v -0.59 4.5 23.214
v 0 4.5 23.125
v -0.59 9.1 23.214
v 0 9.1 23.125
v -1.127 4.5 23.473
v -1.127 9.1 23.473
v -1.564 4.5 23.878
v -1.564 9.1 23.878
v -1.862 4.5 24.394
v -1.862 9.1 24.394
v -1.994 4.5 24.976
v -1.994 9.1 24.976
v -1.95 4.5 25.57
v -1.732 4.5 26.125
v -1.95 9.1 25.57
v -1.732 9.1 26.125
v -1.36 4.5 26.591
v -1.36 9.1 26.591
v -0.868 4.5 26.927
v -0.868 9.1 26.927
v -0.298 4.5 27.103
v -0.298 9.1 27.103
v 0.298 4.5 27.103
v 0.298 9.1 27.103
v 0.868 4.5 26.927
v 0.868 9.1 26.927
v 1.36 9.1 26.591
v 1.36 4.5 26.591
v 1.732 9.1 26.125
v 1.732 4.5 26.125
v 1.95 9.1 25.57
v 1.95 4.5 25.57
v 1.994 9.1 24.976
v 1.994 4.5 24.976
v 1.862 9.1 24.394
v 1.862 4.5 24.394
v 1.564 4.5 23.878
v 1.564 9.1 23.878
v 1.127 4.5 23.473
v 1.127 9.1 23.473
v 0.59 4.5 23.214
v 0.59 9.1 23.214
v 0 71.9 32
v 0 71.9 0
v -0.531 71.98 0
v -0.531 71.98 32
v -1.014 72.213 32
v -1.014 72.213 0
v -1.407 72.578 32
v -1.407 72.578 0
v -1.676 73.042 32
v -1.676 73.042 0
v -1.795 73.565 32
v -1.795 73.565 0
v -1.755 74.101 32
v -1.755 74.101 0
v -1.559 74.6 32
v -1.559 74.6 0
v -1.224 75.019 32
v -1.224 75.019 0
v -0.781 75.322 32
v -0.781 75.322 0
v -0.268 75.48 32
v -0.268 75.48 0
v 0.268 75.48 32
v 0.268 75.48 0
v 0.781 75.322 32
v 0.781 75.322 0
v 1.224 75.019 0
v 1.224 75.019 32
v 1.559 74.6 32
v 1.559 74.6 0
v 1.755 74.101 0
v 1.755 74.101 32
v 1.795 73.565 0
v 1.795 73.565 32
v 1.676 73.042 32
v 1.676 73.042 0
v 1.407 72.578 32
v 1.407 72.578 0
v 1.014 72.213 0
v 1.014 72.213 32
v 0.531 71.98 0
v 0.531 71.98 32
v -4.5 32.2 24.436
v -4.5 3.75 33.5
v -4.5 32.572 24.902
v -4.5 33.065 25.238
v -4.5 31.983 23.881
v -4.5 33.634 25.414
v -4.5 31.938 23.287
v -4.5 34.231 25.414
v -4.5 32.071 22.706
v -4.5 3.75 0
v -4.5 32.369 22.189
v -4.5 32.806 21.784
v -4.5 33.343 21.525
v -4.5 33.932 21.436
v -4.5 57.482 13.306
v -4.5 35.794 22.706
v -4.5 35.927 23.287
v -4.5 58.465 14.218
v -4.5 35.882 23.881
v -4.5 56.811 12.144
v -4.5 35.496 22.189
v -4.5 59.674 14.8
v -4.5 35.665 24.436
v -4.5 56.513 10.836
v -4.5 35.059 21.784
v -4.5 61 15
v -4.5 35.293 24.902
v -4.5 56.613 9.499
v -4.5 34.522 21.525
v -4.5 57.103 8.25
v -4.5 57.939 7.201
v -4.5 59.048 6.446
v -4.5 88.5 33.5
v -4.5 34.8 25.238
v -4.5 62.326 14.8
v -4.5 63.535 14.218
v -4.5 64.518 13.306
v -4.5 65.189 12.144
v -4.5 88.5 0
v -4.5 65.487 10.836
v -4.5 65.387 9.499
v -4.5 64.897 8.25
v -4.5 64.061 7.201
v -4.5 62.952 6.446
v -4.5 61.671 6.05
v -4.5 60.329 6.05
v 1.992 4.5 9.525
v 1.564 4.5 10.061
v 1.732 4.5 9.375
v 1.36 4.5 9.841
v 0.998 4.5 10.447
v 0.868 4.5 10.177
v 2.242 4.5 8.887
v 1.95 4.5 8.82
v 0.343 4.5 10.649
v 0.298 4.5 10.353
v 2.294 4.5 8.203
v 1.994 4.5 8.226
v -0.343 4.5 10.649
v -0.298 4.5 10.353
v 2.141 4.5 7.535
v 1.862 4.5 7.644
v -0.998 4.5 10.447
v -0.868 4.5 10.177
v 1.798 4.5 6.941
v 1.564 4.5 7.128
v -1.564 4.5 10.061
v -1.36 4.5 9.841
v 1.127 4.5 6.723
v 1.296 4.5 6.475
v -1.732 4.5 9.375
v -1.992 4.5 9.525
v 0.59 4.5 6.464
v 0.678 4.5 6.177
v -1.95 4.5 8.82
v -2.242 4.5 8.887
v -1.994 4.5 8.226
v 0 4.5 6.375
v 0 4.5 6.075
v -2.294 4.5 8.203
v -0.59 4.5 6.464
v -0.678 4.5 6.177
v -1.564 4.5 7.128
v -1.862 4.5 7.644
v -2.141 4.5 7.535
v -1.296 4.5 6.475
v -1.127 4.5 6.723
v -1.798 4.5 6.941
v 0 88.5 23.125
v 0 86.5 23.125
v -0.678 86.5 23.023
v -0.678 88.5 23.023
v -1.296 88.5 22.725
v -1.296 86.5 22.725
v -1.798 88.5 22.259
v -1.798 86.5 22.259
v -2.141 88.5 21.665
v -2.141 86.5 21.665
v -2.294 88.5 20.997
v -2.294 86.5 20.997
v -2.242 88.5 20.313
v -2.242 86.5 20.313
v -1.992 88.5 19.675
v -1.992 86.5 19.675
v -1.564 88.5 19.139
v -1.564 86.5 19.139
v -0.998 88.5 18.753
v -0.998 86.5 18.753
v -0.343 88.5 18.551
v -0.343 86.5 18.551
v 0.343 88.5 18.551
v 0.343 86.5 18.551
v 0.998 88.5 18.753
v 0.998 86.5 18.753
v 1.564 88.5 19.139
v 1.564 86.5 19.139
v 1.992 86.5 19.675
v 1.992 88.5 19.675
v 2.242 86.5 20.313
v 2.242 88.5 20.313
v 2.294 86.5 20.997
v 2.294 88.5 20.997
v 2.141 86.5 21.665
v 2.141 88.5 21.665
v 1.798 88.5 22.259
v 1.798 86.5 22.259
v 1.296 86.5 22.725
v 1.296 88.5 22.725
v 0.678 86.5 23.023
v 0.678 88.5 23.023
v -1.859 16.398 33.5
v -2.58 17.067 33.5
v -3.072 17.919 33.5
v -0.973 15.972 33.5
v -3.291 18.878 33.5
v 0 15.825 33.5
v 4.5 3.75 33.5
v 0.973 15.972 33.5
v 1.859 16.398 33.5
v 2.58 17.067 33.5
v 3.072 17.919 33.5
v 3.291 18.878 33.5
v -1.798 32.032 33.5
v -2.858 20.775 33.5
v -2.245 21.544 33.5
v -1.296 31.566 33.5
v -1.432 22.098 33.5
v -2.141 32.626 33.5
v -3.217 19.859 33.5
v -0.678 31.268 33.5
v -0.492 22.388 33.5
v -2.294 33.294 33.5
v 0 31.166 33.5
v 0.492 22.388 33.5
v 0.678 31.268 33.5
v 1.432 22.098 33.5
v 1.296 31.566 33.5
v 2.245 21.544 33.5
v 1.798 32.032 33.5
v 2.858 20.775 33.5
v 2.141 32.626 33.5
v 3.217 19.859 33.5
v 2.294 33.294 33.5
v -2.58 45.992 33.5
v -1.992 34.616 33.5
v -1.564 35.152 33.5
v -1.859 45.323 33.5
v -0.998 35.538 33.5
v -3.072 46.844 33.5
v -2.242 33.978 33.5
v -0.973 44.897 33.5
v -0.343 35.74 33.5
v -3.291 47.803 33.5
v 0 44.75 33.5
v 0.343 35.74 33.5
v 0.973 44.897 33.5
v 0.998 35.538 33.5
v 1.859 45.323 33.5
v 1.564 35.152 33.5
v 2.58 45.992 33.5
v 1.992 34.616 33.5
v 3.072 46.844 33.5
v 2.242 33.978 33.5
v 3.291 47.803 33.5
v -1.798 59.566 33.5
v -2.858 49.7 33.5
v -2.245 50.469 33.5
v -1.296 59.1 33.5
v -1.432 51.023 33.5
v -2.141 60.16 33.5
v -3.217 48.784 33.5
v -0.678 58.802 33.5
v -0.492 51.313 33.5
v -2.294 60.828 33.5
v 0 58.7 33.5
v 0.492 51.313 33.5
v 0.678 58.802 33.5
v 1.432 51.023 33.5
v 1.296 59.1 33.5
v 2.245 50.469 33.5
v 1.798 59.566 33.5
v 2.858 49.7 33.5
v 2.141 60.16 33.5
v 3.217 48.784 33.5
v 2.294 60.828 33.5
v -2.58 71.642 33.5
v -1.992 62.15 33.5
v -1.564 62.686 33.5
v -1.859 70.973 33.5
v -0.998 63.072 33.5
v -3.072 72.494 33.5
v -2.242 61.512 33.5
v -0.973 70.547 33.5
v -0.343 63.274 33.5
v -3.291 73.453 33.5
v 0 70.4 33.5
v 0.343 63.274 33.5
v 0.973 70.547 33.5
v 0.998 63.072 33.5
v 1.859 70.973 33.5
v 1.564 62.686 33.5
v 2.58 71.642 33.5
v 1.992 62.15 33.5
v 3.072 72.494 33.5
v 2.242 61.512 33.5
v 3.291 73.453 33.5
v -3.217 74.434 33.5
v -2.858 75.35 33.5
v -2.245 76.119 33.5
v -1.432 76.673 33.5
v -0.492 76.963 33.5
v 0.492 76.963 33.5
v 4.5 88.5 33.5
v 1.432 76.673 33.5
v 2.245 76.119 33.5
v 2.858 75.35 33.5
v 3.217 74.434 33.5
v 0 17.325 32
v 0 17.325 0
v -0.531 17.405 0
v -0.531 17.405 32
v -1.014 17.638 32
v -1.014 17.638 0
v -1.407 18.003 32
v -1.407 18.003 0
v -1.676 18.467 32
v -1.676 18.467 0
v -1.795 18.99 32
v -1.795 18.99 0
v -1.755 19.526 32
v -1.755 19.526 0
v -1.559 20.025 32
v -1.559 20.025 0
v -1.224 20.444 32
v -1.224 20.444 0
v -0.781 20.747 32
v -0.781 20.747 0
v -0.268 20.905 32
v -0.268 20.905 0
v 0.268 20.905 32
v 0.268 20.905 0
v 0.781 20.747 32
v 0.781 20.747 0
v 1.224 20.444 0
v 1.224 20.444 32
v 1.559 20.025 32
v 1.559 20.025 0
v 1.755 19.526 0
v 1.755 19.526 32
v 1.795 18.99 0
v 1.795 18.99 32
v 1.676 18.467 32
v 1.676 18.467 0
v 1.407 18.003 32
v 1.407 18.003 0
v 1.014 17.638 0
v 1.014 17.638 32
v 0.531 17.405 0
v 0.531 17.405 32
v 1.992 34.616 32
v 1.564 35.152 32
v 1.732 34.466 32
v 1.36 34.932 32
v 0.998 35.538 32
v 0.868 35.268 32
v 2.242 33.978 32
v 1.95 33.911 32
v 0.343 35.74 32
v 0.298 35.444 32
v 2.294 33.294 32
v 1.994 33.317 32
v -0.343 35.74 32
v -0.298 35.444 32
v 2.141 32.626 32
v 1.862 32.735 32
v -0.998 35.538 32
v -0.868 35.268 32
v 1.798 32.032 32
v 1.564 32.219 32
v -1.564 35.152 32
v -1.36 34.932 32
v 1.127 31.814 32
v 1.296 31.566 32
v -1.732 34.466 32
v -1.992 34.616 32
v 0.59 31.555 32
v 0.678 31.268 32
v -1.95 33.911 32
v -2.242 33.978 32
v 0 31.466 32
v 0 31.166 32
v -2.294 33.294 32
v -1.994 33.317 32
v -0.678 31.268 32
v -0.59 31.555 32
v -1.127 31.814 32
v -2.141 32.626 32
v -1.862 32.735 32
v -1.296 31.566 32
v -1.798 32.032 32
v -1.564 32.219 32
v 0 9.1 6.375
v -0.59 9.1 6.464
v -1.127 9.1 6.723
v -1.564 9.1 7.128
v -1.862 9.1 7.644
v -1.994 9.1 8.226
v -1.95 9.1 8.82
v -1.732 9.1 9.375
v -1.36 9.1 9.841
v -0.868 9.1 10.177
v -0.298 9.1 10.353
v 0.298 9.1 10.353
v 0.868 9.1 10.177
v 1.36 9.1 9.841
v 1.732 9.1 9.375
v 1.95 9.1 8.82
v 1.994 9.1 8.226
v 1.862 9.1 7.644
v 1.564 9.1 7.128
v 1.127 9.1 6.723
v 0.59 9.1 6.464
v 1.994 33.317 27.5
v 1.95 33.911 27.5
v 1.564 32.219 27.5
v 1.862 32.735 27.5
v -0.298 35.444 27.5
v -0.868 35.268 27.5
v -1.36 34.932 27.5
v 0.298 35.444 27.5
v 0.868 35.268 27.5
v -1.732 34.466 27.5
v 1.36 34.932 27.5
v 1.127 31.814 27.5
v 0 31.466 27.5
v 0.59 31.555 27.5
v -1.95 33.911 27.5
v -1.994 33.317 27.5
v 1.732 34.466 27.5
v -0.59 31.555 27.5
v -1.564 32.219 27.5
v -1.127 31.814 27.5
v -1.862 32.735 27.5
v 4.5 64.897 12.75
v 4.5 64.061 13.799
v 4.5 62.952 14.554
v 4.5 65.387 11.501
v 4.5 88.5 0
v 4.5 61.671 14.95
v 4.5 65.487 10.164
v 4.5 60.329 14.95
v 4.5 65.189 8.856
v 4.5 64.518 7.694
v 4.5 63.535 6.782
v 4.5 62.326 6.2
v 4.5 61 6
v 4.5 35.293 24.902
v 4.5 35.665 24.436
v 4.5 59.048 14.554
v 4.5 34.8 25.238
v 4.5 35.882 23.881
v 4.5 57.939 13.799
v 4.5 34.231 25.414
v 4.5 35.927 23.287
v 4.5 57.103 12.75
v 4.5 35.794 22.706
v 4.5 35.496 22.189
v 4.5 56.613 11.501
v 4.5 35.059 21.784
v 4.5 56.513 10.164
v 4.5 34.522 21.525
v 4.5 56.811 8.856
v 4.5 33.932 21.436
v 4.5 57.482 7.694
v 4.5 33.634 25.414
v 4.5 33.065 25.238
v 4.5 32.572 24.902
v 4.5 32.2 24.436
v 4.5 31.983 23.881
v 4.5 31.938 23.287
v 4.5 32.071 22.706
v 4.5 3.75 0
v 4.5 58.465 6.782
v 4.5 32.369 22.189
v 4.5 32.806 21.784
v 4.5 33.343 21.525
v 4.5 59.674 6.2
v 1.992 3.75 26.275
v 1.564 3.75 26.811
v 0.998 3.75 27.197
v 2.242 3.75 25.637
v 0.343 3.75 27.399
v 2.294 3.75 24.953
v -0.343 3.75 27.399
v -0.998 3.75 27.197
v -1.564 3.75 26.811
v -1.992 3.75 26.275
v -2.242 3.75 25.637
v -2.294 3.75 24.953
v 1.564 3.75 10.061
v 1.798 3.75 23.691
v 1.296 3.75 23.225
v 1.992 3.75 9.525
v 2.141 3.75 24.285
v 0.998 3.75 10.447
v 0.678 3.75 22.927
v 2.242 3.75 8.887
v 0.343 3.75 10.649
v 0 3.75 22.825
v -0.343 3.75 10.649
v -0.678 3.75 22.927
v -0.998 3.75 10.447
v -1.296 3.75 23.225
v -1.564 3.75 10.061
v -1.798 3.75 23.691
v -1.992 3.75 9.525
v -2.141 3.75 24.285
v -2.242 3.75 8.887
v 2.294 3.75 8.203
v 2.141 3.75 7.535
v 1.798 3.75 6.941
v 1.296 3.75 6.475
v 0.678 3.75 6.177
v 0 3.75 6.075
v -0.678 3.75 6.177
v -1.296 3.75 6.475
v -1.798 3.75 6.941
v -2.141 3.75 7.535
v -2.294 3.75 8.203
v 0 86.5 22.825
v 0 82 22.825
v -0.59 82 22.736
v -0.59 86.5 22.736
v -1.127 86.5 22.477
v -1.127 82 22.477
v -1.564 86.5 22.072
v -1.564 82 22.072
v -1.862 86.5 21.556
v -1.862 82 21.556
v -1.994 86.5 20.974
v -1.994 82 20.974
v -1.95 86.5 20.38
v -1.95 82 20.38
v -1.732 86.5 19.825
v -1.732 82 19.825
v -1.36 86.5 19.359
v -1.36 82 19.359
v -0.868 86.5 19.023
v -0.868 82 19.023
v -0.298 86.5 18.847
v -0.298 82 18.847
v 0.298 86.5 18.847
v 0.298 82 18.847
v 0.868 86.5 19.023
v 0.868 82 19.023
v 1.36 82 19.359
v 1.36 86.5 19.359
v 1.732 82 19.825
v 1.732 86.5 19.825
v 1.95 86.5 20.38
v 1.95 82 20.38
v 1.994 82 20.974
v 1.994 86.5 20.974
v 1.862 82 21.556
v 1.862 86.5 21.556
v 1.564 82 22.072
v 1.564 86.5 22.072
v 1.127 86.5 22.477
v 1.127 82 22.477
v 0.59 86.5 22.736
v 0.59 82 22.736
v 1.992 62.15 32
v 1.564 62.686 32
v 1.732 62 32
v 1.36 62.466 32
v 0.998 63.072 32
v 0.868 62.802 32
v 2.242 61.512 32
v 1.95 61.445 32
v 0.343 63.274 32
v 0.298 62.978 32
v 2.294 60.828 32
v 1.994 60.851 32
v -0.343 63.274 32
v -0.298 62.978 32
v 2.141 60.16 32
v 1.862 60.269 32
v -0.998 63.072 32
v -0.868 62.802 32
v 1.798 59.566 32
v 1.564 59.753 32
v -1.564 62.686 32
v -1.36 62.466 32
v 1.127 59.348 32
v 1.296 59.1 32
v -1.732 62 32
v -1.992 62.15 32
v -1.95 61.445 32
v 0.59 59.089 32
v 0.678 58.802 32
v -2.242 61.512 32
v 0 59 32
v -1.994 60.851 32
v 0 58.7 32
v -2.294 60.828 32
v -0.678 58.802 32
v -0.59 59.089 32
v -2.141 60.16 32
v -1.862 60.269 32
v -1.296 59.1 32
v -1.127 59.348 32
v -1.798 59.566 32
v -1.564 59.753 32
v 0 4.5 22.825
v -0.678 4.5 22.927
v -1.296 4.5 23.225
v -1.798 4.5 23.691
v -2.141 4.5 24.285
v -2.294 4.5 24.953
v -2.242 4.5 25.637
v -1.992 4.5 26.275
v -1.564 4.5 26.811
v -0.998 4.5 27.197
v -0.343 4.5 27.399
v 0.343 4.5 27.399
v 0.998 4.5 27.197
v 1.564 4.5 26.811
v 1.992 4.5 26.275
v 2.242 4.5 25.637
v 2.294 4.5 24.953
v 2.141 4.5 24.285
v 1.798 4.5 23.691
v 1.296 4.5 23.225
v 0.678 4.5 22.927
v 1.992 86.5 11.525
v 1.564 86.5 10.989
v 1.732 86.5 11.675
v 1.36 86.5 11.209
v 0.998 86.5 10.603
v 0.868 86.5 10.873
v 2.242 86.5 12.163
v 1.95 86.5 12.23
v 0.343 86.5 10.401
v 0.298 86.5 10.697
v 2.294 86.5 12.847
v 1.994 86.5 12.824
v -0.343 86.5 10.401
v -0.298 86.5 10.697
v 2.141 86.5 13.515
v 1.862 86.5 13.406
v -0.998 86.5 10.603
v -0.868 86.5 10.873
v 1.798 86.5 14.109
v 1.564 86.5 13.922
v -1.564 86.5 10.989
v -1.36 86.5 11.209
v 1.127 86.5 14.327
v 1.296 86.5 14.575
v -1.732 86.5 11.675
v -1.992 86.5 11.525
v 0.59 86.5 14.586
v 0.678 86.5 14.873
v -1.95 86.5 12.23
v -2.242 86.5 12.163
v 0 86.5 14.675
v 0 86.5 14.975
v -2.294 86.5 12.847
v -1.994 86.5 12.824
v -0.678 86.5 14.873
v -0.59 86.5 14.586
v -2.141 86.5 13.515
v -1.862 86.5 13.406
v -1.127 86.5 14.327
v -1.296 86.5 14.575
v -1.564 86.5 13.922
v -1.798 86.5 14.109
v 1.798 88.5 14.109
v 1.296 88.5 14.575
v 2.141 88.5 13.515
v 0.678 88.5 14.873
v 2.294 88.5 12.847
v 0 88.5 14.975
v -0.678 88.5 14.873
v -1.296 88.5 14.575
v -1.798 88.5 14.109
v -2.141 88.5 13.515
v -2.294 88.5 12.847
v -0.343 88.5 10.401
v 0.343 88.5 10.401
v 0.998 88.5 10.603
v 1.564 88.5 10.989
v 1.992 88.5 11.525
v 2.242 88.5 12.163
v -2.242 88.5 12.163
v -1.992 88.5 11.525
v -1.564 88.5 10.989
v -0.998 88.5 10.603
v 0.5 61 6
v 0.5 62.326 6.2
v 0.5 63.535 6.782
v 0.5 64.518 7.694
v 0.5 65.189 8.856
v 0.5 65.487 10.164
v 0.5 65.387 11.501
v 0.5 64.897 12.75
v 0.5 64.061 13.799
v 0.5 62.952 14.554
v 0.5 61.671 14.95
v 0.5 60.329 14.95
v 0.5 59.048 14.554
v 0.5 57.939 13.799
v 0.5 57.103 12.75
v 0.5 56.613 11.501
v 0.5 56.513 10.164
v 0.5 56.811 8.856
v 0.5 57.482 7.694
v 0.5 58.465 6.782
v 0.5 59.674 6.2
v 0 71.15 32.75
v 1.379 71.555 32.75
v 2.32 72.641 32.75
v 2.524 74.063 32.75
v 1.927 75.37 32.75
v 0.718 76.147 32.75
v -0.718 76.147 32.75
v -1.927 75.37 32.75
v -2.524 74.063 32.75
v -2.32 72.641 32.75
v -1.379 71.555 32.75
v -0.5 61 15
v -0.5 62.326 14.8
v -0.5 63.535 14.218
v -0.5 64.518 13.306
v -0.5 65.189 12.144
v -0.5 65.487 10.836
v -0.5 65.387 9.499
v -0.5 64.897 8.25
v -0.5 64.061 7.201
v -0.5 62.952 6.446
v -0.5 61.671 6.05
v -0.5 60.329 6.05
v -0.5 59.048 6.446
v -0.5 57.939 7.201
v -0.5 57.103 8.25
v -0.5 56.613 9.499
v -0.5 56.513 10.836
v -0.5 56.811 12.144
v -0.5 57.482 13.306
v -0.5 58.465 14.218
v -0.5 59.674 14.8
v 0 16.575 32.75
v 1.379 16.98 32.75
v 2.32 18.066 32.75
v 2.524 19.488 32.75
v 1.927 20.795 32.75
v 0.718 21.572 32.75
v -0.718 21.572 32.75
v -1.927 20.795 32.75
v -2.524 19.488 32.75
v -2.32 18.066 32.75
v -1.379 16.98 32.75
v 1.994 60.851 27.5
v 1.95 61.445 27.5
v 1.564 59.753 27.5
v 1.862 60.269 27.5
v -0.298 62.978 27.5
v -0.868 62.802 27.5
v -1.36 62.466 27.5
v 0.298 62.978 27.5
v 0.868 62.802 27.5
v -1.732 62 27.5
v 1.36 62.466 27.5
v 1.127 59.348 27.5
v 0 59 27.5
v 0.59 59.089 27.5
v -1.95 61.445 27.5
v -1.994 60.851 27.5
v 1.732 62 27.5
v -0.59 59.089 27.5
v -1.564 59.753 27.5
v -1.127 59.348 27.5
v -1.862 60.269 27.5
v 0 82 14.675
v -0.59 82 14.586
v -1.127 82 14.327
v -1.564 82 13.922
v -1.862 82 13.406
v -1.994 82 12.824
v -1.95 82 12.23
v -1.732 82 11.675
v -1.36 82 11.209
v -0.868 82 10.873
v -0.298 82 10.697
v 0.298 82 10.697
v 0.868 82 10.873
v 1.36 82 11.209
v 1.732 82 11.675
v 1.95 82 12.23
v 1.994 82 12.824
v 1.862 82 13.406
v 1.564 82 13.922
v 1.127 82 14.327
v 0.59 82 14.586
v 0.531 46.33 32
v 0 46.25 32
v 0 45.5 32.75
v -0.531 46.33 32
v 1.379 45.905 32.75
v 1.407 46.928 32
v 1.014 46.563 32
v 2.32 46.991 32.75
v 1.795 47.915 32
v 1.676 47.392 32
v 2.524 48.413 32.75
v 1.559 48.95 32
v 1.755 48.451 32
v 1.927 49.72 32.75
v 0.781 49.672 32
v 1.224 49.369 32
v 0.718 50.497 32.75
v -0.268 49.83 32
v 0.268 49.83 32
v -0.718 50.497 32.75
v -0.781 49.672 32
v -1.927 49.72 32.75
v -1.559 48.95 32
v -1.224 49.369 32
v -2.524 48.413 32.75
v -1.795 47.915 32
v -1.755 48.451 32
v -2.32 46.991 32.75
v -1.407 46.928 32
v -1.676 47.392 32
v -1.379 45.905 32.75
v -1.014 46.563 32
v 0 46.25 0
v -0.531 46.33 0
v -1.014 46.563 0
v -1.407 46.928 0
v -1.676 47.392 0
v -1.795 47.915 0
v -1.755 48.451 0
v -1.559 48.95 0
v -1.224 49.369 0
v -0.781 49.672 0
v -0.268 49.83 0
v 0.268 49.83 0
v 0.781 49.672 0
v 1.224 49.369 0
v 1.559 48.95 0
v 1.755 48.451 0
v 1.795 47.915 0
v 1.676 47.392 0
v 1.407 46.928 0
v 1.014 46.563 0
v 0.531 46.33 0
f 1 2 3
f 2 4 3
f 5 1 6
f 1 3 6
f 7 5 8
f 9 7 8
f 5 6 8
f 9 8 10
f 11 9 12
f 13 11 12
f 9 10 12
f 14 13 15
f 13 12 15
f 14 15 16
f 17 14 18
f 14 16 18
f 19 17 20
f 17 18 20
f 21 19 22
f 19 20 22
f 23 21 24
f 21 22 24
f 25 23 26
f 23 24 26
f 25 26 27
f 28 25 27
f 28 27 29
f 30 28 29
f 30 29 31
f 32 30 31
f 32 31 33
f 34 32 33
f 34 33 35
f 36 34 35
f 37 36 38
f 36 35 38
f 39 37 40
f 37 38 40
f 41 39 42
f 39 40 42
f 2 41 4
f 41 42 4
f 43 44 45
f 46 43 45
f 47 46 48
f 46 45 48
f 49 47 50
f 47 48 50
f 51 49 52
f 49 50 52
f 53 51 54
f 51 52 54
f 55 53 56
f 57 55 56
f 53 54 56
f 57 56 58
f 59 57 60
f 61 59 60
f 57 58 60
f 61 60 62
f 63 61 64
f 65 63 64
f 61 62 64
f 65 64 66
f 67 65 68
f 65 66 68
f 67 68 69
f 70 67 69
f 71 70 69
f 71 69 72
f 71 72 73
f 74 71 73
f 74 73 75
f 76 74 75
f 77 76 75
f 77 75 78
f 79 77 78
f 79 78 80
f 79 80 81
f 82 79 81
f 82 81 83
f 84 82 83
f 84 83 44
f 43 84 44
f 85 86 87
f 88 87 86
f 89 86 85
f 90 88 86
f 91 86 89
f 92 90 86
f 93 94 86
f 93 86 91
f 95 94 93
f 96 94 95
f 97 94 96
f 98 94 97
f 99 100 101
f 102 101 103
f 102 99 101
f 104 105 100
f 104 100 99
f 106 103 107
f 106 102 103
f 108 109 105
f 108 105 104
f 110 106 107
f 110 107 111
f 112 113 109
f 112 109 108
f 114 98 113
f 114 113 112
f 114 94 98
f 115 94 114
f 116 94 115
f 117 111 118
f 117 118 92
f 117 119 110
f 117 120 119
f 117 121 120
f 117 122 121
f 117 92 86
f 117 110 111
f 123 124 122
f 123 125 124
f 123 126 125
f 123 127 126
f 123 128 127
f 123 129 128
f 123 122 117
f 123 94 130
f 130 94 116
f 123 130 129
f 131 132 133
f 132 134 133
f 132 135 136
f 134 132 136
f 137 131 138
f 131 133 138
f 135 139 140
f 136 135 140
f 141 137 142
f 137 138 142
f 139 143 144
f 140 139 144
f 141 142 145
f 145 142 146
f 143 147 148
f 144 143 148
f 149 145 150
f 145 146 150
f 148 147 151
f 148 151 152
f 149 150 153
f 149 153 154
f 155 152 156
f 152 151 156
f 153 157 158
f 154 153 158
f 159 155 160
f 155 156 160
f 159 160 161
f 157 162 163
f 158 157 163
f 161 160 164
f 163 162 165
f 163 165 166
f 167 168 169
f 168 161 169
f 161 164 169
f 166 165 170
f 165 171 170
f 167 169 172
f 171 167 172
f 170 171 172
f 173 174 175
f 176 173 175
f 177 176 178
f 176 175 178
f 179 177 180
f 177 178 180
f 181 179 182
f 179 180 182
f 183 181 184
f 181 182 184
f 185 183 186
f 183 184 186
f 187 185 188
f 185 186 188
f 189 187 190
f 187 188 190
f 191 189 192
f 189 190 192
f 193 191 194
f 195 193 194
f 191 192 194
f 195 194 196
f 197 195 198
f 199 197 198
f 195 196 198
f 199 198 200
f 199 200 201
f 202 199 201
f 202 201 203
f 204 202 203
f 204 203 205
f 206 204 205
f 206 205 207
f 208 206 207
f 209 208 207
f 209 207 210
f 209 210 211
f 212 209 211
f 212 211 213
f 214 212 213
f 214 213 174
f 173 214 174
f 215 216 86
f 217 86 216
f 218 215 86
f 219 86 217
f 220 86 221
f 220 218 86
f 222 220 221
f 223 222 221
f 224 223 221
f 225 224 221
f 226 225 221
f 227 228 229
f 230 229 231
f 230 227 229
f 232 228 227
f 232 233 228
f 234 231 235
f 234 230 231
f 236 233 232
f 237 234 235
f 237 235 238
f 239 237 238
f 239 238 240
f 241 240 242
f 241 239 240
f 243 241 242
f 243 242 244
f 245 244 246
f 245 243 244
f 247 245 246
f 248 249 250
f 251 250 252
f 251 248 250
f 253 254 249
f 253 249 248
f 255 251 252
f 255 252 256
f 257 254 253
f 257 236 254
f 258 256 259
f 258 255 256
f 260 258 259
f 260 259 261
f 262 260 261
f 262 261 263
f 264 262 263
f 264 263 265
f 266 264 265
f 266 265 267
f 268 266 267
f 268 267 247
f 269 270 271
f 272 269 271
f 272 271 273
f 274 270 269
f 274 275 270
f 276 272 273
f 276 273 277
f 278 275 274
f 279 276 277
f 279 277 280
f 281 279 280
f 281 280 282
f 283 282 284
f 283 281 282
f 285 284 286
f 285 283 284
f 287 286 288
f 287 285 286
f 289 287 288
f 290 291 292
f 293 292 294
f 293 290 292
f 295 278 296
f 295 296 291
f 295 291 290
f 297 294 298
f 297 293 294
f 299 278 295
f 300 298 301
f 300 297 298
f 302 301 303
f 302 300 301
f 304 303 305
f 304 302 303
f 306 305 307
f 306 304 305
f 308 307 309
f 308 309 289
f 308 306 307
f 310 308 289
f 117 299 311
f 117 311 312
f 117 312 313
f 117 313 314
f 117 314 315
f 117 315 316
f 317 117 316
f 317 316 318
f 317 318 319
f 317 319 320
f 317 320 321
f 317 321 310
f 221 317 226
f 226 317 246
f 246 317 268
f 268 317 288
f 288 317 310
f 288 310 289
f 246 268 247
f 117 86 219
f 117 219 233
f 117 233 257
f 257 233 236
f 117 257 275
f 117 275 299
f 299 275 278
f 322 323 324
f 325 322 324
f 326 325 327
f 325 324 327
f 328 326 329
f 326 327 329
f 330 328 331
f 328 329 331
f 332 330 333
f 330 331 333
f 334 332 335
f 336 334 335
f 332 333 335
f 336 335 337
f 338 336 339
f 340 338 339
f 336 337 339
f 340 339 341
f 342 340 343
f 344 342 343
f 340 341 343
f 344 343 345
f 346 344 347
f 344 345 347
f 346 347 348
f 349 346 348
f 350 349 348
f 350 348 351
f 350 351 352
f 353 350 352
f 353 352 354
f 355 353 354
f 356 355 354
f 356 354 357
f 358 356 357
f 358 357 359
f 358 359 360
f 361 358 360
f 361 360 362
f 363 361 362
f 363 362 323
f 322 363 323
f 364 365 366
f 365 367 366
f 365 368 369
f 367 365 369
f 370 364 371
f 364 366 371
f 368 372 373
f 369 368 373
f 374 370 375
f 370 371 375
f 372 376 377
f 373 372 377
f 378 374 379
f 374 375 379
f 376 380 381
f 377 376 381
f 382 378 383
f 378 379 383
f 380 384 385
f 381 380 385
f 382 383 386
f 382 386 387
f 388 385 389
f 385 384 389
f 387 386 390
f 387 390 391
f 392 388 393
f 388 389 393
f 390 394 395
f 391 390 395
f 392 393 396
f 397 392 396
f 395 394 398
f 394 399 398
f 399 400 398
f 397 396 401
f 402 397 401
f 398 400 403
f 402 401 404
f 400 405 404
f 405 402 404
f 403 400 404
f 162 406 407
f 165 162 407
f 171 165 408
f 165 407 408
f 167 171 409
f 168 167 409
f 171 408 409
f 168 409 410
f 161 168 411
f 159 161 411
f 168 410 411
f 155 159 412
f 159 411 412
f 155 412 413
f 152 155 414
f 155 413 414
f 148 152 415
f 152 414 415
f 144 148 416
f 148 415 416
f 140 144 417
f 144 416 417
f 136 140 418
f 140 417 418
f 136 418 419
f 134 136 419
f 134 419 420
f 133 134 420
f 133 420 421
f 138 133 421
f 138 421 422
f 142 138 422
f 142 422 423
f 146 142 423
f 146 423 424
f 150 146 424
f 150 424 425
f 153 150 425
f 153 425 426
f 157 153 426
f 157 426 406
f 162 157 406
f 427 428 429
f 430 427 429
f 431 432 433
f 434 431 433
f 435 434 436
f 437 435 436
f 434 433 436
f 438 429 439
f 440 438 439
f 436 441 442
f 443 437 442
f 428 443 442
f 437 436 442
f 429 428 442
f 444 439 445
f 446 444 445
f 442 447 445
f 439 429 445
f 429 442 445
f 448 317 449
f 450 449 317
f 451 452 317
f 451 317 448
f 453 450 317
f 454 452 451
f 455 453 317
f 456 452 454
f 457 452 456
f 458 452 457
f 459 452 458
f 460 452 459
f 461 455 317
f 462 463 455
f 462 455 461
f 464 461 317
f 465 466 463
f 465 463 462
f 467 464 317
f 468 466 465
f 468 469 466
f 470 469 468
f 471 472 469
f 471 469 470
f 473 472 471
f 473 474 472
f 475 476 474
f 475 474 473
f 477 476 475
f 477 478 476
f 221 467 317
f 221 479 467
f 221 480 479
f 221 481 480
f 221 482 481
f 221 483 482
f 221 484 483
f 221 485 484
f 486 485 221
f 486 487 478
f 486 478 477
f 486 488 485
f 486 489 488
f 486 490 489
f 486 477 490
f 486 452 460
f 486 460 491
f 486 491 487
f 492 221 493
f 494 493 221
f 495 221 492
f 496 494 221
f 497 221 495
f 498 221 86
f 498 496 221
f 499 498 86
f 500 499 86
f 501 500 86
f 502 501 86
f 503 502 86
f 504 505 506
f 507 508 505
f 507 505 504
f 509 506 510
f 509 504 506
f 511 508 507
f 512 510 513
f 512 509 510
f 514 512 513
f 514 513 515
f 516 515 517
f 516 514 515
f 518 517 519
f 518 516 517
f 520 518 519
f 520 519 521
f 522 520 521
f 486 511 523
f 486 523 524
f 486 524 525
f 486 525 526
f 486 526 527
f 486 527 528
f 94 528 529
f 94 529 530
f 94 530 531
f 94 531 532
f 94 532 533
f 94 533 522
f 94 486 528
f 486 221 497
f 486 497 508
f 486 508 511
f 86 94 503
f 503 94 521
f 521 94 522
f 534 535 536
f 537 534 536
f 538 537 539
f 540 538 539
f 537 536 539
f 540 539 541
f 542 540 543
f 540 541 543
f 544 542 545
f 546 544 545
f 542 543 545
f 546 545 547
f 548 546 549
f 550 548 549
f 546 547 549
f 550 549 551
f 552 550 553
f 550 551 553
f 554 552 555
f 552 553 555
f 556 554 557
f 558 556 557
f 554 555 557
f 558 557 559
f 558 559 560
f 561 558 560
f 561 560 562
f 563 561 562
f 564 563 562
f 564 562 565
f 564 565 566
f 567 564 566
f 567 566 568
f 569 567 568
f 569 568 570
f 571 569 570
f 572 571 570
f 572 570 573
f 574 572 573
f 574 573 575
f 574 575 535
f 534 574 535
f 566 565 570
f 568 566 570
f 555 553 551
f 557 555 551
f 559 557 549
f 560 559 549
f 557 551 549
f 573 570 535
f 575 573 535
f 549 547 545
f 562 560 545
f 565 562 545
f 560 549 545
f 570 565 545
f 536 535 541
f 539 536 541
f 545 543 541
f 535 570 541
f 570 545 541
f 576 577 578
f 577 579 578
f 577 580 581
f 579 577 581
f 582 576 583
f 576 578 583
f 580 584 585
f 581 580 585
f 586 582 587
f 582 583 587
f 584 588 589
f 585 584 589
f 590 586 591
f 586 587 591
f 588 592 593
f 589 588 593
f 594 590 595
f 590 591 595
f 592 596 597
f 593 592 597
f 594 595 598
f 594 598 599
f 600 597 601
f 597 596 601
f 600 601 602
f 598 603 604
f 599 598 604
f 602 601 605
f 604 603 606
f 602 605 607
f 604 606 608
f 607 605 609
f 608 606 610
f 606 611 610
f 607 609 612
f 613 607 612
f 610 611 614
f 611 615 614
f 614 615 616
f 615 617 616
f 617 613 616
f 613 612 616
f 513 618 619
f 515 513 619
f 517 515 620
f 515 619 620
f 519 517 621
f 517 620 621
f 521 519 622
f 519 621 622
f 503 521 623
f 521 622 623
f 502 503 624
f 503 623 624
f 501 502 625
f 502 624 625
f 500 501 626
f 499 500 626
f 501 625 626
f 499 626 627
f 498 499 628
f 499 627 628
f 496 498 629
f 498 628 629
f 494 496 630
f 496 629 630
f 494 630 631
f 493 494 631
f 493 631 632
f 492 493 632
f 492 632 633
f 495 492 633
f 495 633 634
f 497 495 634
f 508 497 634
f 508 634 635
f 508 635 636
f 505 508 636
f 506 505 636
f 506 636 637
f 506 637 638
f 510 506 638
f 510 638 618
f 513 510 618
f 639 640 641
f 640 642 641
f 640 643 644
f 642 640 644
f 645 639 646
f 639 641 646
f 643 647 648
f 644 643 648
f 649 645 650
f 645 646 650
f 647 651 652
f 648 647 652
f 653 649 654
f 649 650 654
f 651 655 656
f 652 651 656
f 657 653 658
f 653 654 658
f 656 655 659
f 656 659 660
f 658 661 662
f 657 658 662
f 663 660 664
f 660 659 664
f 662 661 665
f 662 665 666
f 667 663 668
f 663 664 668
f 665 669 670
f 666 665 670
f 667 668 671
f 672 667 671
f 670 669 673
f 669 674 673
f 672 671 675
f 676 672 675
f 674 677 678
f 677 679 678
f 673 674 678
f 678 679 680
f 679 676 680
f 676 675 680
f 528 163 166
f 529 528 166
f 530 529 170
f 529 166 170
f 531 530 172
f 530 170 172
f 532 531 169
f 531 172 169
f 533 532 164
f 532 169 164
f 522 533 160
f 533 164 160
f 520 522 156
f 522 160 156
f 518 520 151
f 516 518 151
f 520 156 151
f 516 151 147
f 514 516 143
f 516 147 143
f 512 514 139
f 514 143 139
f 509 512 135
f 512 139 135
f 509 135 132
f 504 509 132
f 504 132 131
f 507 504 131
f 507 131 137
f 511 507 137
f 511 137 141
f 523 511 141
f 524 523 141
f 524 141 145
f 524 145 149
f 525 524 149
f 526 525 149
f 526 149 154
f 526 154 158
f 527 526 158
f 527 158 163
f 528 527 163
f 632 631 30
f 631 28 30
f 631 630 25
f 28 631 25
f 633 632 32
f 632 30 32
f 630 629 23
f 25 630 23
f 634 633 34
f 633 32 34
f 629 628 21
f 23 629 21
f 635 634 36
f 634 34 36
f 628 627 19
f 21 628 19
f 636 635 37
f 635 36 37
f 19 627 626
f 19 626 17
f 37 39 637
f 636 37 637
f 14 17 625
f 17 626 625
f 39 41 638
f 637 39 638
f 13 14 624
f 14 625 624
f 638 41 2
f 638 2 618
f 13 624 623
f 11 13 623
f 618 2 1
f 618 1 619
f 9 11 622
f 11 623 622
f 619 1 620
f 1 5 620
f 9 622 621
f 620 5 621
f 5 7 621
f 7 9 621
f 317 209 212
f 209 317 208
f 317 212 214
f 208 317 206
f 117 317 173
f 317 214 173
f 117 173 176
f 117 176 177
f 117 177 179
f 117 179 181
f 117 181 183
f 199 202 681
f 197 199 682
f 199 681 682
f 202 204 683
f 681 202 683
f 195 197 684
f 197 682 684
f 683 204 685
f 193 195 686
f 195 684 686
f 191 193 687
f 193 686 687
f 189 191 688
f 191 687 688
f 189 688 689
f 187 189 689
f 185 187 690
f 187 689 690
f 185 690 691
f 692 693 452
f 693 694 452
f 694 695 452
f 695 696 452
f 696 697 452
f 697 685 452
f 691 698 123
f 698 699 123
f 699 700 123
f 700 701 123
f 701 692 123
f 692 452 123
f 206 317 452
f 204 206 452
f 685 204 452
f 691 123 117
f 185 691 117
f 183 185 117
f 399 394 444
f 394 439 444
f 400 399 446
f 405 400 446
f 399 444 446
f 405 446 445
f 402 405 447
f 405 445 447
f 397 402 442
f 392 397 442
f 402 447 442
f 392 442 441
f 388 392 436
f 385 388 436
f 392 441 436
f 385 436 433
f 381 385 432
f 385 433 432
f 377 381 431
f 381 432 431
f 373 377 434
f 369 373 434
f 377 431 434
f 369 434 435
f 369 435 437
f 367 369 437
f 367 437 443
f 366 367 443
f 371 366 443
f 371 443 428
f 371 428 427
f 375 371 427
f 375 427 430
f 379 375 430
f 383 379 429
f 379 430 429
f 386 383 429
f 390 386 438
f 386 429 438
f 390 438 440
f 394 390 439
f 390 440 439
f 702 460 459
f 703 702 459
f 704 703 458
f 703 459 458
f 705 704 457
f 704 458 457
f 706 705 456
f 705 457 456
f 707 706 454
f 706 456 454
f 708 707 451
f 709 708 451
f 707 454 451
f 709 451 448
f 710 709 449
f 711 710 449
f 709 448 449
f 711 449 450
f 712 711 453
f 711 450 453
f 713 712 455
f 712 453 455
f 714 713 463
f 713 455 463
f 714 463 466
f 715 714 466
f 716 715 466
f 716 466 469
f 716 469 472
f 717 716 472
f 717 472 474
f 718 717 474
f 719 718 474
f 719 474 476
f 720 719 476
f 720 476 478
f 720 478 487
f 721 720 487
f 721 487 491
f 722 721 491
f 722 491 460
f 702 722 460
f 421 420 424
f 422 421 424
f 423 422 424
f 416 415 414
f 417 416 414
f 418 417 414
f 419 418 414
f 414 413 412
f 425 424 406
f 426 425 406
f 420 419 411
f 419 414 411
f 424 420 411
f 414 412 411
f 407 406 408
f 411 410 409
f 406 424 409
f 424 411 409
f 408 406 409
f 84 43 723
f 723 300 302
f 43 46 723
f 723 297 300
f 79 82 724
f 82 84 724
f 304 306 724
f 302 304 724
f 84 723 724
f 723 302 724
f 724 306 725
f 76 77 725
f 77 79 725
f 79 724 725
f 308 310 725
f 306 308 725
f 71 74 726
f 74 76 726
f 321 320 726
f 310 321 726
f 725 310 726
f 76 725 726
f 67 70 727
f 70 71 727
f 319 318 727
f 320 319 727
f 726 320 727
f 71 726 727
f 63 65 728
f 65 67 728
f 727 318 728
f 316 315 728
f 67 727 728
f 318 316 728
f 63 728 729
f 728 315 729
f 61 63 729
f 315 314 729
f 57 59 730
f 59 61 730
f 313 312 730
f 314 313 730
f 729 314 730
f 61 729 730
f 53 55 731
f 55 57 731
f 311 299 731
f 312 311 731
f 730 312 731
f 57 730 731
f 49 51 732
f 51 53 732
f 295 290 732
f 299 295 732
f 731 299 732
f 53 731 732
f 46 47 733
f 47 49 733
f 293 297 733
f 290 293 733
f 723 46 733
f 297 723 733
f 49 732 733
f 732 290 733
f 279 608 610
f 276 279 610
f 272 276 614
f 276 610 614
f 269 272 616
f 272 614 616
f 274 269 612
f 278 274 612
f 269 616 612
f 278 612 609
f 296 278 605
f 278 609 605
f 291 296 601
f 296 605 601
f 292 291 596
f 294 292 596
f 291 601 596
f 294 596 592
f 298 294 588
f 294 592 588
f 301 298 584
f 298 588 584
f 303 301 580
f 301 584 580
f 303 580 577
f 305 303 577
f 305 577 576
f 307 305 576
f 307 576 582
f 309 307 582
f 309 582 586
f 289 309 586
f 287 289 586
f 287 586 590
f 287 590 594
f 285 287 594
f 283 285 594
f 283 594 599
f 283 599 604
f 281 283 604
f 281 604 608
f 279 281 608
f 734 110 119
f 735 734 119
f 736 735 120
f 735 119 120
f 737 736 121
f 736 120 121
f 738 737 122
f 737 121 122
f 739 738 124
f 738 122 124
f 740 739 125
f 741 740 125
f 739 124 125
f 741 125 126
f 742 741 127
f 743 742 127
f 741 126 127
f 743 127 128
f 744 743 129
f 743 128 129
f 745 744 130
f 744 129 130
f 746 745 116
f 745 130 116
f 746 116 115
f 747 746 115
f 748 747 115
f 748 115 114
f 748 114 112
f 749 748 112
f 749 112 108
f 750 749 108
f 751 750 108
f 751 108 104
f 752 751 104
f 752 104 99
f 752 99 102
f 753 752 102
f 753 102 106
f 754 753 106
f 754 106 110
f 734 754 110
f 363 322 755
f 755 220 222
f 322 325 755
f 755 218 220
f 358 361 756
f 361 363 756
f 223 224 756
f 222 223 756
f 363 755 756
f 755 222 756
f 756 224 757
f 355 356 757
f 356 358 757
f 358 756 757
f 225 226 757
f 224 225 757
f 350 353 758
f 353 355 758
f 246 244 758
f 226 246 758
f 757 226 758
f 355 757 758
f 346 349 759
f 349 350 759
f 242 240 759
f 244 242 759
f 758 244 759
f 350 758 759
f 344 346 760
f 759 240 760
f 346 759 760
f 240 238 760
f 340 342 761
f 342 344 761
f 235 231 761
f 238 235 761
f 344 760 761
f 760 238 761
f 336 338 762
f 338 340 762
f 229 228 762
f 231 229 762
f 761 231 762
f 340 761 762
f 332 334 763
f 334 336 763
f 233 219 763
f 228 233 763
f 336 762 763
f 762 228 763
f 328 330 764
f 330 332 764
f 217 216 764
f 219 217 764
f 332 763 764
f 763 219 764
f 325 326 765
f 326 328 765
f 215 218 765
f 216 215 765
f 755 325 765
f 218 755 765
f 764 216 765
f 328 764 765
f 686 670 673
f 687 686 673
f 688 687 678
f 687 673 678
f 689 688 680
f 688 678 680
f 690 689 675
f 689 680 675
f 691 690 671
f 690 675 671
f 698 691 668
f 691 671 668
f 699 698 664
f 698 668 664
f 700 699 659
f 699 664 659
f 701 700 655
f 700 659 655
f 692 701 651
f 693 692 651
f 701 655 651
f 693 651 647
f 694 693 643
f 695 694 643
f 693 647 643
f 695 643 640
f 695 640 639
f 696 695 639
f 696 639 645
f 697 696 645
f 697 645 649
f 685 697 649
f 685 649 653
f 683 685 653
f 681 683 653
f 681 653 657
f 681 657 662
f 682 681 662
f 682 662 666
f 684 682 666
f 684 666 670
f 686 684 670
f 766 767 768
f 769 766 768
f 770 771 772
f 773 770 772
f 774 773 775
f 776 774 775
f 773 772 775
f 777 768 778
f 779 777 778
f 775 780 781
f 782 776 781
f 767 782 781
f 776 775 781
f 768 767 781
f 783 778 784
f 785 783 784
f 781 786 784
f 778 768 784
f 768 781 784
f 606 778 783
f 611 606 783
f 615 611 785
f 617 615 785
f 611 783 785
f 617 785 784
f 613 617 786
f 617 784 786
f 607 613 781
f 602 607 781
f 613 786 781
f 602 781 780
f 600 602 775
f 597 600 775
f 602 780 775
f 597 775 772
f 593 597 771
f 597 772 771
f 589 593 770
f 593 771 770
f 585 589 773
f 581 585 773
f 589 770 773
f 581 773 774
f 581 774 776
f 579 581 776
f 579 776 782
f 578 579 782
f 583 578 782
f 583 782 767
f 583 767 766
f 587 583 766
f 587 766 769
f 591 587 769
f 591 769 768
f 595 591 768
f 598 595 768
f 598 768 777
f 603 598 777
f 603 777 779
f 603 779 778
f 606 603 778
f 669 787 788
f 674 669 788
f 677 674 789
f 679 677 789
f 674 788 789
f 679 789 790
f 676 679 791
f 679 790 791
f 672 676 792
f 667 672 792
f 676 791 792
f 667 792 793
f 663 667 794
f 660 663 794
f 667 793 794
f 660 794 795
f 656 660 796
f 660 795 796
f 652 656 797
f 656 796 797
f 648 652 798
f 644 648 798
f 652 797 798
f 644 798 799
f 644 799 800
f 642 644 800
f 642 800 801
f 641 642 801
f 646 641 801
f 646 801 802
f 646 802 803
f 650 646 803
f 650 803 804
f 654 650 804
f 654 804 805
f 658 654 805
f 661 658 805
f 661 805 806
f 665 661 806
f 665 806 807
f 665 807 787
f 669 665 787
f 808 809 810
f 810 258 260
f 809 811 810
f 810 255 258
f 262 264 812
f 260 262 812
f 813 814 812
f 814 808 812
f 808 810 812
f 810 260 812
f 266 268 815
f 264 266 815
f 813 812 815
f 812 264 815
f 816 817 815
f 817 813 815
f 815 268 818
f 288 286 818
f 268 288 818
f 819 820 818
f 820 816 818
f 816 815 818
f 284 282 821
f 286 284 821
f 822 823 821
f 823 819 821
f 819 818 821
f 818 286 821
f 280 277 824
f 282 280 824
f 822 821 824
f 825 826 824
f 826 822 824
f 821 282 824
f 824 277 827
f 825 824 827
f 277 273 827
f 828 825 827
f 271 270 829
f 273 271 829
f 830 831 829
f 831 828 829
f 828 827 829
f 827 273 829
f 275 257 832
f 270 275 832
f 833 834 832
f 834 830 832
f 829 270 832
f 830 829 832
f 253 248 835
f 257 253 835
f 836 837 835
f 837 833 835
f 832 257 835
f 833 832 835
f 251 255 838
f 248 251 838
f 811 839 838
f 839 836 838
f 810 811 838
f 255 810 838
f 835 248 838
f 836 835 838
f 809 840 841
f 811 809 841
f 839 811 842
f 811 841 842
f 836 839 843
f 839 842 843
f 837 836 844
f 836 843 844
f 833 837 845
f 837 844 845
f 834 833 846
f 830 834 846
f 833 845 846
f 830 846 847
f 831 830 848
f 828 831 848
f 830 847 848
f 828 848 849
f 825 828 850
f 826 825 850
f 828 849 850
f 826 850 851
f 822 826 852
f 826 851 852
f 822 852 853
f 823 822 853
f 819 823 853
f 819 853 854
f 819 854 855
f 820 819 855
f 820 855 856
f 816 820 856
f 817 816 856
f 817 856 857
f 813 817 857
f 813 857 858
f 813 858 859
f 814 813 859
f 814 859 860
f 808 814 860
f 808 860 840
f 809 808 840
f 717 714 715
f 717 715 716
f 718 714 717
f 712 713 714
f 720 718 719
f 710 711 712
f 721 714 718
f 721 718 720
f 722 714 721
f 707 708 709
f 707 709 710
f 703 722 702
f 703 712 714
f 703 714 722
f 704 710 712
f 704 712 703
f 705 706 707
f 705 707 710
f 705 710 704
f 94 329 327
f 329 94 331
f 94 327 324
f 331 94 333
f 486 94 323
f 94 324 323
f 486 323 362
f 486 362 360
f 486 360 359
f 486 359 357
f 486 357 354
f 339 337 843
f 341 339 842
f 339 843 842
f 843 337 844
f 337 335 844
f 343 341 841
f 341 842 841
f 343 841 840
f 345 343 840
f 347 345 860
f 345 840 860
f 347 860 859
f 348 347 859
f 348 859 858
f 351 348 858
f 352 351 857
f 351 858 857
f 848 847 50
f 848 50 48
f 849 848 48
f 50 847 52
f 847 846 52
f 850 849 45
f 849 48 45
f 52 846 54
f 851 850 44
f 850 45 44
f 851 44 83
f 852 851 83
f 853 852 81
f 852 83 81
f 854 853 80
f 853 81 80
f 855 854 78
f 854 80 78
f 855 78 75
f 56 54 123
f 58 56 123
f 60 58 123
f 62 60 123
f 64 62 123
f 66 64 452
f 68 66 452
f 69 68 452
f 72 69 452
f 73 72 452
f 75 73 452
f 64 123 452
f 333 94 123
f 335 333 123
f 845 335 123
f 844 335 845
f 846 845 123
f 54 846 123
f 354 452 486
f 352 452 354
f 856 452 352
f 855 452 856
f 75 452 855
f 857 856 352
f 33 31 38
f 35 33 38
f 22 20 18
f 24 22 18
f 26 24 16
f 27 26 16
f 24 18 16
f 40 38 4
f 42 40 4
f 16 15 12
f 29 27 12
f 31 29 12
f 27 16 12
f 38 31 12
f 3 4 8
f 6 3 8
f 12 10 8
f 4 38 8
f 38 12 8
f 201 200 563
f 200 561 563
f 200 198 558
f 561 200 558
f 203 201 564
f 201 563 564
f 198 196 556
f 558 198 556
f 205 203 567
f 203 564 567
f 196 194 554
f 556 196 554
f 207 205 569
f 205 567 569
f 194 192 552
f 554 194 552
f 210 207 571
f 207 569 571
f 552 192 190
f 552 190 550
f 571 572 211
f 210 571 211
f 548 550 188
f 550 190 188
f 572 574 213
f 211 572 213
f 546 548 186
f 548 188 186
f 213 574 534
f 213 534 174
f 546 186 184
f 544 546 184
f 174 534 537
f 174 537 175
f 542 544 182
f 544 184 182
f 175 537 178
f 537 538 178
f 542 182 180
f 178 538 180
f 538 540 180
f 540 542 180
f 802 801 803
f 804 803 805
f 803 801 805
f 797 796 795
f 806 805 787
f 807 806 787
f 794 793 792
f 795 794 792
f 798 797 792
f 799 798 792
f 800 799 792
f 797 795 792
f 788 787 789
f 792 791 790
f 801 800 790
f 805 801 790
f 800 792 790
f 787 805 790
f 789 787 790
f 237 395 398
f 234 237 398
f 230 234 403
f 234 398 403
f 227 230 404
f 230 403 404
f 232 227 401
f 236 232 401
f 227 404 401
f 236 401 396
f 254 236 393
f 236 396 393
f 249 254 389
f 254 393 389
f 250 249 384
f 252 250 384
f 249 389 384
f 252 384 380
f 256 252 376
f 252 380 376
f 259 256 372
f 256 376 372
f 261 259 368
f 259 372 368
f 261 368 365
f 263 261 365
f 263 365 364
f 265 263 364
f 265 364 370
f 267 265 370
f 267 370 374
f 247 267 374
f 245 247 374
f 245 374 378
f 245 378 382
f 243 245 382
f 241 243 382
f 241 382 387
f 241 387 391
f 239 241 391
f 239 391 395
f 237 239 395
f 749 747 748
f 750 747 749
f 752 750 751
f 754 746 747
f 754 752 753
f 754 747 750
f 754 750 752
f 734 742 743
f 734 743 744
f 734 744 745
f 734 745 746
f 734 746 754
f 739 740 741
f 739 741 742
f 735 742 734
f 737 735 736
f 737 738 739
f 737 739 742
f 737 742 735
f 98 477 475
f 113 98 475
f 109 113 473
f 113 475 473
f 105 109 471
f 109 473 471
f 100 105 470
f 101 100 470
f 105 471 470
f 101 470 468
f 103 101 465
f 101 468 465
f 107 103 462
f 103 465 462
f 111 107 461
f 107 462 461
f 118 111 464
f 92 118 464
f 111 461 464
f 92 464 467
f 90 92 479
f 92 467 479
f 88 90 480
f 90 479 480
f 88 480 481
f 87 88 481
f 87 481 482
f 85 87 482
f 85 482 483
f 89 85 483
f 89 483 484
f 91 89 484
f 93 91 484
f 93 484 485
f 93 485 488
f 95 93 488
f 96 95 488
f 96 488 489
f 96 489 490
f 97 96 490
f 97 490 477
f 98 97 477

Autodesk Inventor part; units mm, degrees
ref_plane "YZ Plane" through (0, 0, 0) normal (1, 0, 0) x (0, 1, 0)
ref_plane "XZ Plane" through (0, 0, 0) normal (0, 1, 0) x (-1, 0, 0)
ref_plane "Work Plane1" through (0, 0, 0) normal (0, 0, 1) x (1, 0, 0)
ref_plane "Work Plane2" through (-89, -40.3889, 33.5) normal (0, 0, 1) x (1, 0, 0)
sketch "Sketch1" plane through (0, 0, 0) normal (0, 0, 1) x (1, 0, 0)
  line L0 (23.5, 88.5) -> (-23.5, 88.5) projected
  line L1 (-23.5, 88.5) -> (-23.5, 36.5) projected
  line L2 (-26.5, 33.5) -> (-89, 33.5) projected
  line L3 (-89, 33.5) -> (-89, -72.5) projected
  line L4 (-89, -72.5) -> (-77, -72.5) projected
  line L5 (-74, -75.5) -> (-74, -93.5) projected
  line L6 (-74, -93.5) -> (74, -93.5) projected
  line L7 (74, -93.5) -> (74, -75.5) projected
  line L8 (77, -72.5) -> (89, -72.5) projected
  line L9 (89, -72.5) -> (89, 33.5) projected
  line L10 (89, 33.5) -> (26.5, 33.5) projected
  line L11 (23.5, 36.5) -> (23.5, 88.5) projected
  line L12 (-4.5, 81.5) -> (-4.5, 36.5) projected
  line L13 (-7.5, 33.5) -> (-13.5, 33.5) projected
  line L14 (-16.5, 36.5) -> (-16.5, 81.5) projected
  line L15 (-13.5, 84.5) -> (-7.5, 84.5) projected
  line L16 (16.5, 81.5) -> (16.5, 36.5) projected
  line L17 (13.5, 33.5) -> (7.5, 33.5) projected
  line L18 (4.5, 36.5) -> (4.5, 81.5) projected
  line L19 (7.5, 84.5) -> (13.5, 84.5) projected
  line L20 (-4.5, 88.5) -> (4.5, 88.5)
  line L21 (4.5, 88.5) -> (4.5, 3.75)
  line L22 (4.5, 3.75) -> (-4.5, 3.75)
  line L23 (-4.5, 3.75) -> (-4.5, 88.5)
  line L24 (-32.2, 4.75) -> (-59.9, 4.75)
  arc A0 (13.5, 33.5) -> (16.5, 36.5) centre (13.5, 36.5) ccw projected
  arc A1 (4.5, 36.5) -> (7.5, 33.5) centre (7.5, 36.5) ccw projected
  arc A2 (7.5, 84.5) -> (4.5, 81.5) centre (7.5, 81.5) ccw projected
  arc A3 (16.5, 81.5) -> (13.5, 84.5) centre (13.5, 81.5) ccw projected
  arc A4 (-4.5, 81.5) -> (-7.5, 84.5) centre (-7.5, 81.5) ccw projected
  arc A5 (-7.5, 33.5) -> (-4.5, 36.5) centre (-7.5, 36.5) ccw projected
  arc A6 (-16.5, 36.5) -> (-13.5, 33.5) centre (-13.5, 36.5) ccw projected
  arc A7 (-13.5, 84.5) -> (-16.5, 81.5) centre (-13.5, 81.5) ccw projected
  arc A8 (-26.5, 33.5) -> (-23.5, 36.5) centre (-26.5, 36.5) ccw projected
  arc A9 (-74, -75.5) -> (-77, -72.5) centre (-77, -75.5) ccw projected
  arc A10 (77, -72.5) -> (74, -75.5) centre (77, -75.5) ccw projected
  arc A11 (23.5, 36.5) -> (26.5, 33.5) centre (26.5, 36.5) ccw projected
  point P0 (0, 0)
  point P1 (-4.5, 81.5)
  point P2 (-4.5, 36.5)
  dimension "d0" = 1
extrude "Extrusion1" add sketch "Sketch1" along normal up to surface (33.5 mm away) contours L21 L18 L22 L23 L12 L0
sketch "Sketch2" plane through (4.5, 3.75, 0) normal (1, 0, 0) x (0, 0, -1)
  circle A0 centre (-23.4363, 30.1825) radius 2 projected
  point P0 (0, -3.75)
extrude "Extrusion2" cut sketch "Sketch2" against normal blind 10
sketch "Sketch3" plane through (4.5, 3.75, 0) normal (1, 0, 0) x (0, 0, -1)
  circle A0 centre (-10.5, 57.25) radius 4.5 projected
  point P0 (0, -3.75)
extrude "Extrusion3" cut sketch "Sketch3" against normal blind 4
sketch "Sketch4" plane through (-4.5, 3.75, 0) normal (-1, 0, 0) x (0, 0, 1)
  circle A0 centre (10.5, 57.25) radius 4.5 projected
  point P0 (0, -3.75)
extrude "Extrusion4" cut sketch "Sketch4" against normal blind 4
sketch "Sketch5" plane through (-4.5, 3.75, 33.5) normal (0, 0, 1) x (1, 0, 0)
  line L0 (5, 61.75) -> (5, 52.75) projected
  line L1 (4, 52.75) -> (4, 61.75) projected
  line L2 (9, 28.1825) -> (0, 28.1825) projected
  line L3 (9, 32.1825) -> (0, 32.1825) projected
  line L4 (17, 78.15) -> (-8, 78.15)
  line L5 (-8, 35.85) -> (17, 35.85)
  line L6 (9, 84.75) -> (9, 0) projected
  line L7 (0, 52.75) -> (0, 61.75) projected
  line L8 (9, 35.85) -> (0, 35.85)
  line L9 (0, 35.85) -> (0, 52.75)
  line L10 (0, 52.75) -> (9, 52.75)
  line L11 (9, 52.75) -> (9, 35.85)
  line L12 (0, 0) -> (0, 84.75) projected
  line L13 (9, 78.15) -> (0, 78.15)
  line L14 (0, 78.15) -> (0, 61.75)
  line L15 (0, 61.75) -> (9, 61.75)
  line L16 (9, 61.75) -> (9, 78.15)
  line L17 (-18, 8.625) -> (-18, 22.125) projected
  line L18 (-18, 15.375) -> (27, 15.375)
  line L19 (9, 35.85) -> (0, 52.75)
  line L20 (9, 61.75) -> (9, 52.75) projected
  line L21 (0, 35.85) -> (9, 52.75)
  line L22 (9, 61.75) -> (0, 78.15)
  line L23 (0, 61.75) -> (9, 78.15)
  point P0 (4.5, -3.75)
  point P1 (4.5, 15.375)
  point P2 (4.5, 44.3)
  point P3 (4.5, 69.95)
  dimension "d9" = 4.5
  dimension "d10" = 4.5
hole "Hole1" at (0, 19.125, 33.5) at (0, 48.05, 33.5) at (0, 73.7, 33.5) direction (0, 0, -1) diameter 3.6 end through all countersink diameter 6.6 countersink angle 90 clearance for "Countersunk Flat Head Screw ISO 2009/7046" size "M3" standard "ISO"
sketch "Sketch6" plane through (-4.5, 3.75, 0) normal (0, -1, 0) x (1, 0, 0)
  line L0 (9, 33.5) -> (0, 33.5) projected
  line L1 (0, 0) -> (0, 33.5) projected
  line L2 (0, 0) -> (9, 0) projected
  line L3 (9, 0) -> (9, 33.5) projected
  line L4 (0, 16.75) -> (9, 16.75)
  line L5 (9, 16.75) -> (0, 33.5)
  line L6 (9, 33.5) -> (0, 16.75)
  line L7 (0, 16.75) -> (9, 0)
  line L8 (9, 16.75) -> (0, 0)
  point P0 (4.5, 0)
  point P1 (4.5, 8.375)
  point P2 (4.5, 25.125)
hole "Hole2" at (0, 3.75, 8.375) at (0, 3.75, 25.125) direction (0, 1, 0) diameter 4 depth 5.35 counterbore diameter 4.6 counterbore depth 0.75
sketch "Sketch7" plane through (-4.5, 88.5, 0) normal (0, 1, 0) x (1, 0, 0)
  line L0 (0, -33.5) -> (9, -33.5) projected
  line L1 (0, -33.5) -> (9, -33.5) projected
  line L2 (9, 0) -> (9, -33.5) projected
  line L3 (9, 0) -> (0, 0) projected
  line L4 (0, 0) -> (0, -33.5) projected
  line L5 (-8, -1.4) -> (-8, -6.6) projected
  line L6 (-8, -32.1) -> (-8, -26.9) projected
  line L7 (17, -32.1) -> (17, -26.9) projected
  line L8 (17, -1.4) -> (17, -6.6) projected
  line L9 (17, -32.1) -> (-8, -32.1)
  line L10 (-8, -32.1) -> (-8, -26.9)
  line L11 (-8, -26.9) -> (17, -26.9)
  line L12 (17, -26.9) -> (17, -32.1)
  line L13 (-8, -6.6) -> (17, -6.6)
  line L14 (17, -6.6) -> (17, -1.4)
  line L15 (17, -1.4) -> (-8, -1.4)
  line L16 (-8, -1.4) -> (-8, -6.6)
  line L17 (17, -6.6) -> (-8, -6.6)
  line L18 (-8, -6.6) -> (-8, -8.6)
  line L19 (-8, -8.6) -> (17, -8.6)
  line L20 (17, -8.6) -> (17, -6.6)
  line L21 (-8, -26.9) -> (17, -26.9)
  line L22 (17, -26.9) -> (17, -24.9)
  line L23 (17, -24.9) -> (-8, -24.9)
  line L24 (-8, -24.9) -> (-8, -26.9)
  line L25 (9, 0) -> (9, -33.5) projected
  line L26 (9, -16.75) -> (0, -16.75)
  line L27 (0, 0) -> (0, -33.5) projected
  line L28 (9, -24.9) -> (0, -16.75)
  line L29 (9, -8.6) -> (0, -16.75)
  line L30 (0, -8.6) -> (9, -16.75)
  line L31 (9, -16.75) -> (0, -24.9)
  point P0 (4.5, 0)
  point P1 (4.5, -20.825)
  point P2 (4.5, -12.675)
  dimension "d25" = 2
  dimension "d26" = 2
hole "Hole3" at (0, 88.5, 20.825) at (0, 88.5, 12.675) direction (0, -1, 0) diameter 4 depth 6.5 counterbore diameter 4.6 counterbore depth 2
sketch "Sketch8" plane through (-4.5, 3.75, 33.5) normal (0, 0, 1) x (1, 0, 0)
  line L0 (26, 27.2497) -> (-17, 27.2497)
  line L1 (26, 31.2497) -> (-17, 31.2497)
  line L2 (4, 52.75) -> (-1, 52.75)
  line L3 (4, 61.75) -> (-1, 61.75)
  line L4 (10, 61.75) -> (5, 61.75)
  line L5 (9, 52.75) -> (5, 52.75) projected
  line L6 (0, 0) -> (0, 84.75) projected
  line L7 (9, 52.75) -> (0, 52.75)
  line L8 (0, 52.75) -> (0, 61.75)
  line L9 (0, 61.75) -> (9, 61.75)
  line L10 (9, 61.75) -> (9, 52.75)
  line L11 (9, 28.1825) -> (0, 28.1825) projected
  line L12 (0, 31.2497) -> (9, 31.2497)
  line L13 (9, 31.2497) -> (9, 28.1825)
  line L14 (9, 28.1825) -> (0, 28.1825)
  line L15 (0, 28.1825) -> (0, 31.2497)
  line L16 (9, 28.1825) -> (0, 31.2497)
  line L17 (0, 28.1825) -> (9, 31.2497)
  line L18 (9, 52.75) -> (0, 61.75)
  line L19 (0, 52.75) -> (9, 61.75)
  point P0 (4.5, -3.75)
  point P1 (4.5, 29.7161)
  point P2 (4.5, 57.25)
hole "Hole4" at (0, 33.4661, 33.5) at (0, 61, 33.5) direction (0, 0, -1) diameter 4 depth 6 counterbore diameter 4.6 counterbore depth 1.5
equation "\"d9\" = d10"
properties part number "middle_gear_holder"
